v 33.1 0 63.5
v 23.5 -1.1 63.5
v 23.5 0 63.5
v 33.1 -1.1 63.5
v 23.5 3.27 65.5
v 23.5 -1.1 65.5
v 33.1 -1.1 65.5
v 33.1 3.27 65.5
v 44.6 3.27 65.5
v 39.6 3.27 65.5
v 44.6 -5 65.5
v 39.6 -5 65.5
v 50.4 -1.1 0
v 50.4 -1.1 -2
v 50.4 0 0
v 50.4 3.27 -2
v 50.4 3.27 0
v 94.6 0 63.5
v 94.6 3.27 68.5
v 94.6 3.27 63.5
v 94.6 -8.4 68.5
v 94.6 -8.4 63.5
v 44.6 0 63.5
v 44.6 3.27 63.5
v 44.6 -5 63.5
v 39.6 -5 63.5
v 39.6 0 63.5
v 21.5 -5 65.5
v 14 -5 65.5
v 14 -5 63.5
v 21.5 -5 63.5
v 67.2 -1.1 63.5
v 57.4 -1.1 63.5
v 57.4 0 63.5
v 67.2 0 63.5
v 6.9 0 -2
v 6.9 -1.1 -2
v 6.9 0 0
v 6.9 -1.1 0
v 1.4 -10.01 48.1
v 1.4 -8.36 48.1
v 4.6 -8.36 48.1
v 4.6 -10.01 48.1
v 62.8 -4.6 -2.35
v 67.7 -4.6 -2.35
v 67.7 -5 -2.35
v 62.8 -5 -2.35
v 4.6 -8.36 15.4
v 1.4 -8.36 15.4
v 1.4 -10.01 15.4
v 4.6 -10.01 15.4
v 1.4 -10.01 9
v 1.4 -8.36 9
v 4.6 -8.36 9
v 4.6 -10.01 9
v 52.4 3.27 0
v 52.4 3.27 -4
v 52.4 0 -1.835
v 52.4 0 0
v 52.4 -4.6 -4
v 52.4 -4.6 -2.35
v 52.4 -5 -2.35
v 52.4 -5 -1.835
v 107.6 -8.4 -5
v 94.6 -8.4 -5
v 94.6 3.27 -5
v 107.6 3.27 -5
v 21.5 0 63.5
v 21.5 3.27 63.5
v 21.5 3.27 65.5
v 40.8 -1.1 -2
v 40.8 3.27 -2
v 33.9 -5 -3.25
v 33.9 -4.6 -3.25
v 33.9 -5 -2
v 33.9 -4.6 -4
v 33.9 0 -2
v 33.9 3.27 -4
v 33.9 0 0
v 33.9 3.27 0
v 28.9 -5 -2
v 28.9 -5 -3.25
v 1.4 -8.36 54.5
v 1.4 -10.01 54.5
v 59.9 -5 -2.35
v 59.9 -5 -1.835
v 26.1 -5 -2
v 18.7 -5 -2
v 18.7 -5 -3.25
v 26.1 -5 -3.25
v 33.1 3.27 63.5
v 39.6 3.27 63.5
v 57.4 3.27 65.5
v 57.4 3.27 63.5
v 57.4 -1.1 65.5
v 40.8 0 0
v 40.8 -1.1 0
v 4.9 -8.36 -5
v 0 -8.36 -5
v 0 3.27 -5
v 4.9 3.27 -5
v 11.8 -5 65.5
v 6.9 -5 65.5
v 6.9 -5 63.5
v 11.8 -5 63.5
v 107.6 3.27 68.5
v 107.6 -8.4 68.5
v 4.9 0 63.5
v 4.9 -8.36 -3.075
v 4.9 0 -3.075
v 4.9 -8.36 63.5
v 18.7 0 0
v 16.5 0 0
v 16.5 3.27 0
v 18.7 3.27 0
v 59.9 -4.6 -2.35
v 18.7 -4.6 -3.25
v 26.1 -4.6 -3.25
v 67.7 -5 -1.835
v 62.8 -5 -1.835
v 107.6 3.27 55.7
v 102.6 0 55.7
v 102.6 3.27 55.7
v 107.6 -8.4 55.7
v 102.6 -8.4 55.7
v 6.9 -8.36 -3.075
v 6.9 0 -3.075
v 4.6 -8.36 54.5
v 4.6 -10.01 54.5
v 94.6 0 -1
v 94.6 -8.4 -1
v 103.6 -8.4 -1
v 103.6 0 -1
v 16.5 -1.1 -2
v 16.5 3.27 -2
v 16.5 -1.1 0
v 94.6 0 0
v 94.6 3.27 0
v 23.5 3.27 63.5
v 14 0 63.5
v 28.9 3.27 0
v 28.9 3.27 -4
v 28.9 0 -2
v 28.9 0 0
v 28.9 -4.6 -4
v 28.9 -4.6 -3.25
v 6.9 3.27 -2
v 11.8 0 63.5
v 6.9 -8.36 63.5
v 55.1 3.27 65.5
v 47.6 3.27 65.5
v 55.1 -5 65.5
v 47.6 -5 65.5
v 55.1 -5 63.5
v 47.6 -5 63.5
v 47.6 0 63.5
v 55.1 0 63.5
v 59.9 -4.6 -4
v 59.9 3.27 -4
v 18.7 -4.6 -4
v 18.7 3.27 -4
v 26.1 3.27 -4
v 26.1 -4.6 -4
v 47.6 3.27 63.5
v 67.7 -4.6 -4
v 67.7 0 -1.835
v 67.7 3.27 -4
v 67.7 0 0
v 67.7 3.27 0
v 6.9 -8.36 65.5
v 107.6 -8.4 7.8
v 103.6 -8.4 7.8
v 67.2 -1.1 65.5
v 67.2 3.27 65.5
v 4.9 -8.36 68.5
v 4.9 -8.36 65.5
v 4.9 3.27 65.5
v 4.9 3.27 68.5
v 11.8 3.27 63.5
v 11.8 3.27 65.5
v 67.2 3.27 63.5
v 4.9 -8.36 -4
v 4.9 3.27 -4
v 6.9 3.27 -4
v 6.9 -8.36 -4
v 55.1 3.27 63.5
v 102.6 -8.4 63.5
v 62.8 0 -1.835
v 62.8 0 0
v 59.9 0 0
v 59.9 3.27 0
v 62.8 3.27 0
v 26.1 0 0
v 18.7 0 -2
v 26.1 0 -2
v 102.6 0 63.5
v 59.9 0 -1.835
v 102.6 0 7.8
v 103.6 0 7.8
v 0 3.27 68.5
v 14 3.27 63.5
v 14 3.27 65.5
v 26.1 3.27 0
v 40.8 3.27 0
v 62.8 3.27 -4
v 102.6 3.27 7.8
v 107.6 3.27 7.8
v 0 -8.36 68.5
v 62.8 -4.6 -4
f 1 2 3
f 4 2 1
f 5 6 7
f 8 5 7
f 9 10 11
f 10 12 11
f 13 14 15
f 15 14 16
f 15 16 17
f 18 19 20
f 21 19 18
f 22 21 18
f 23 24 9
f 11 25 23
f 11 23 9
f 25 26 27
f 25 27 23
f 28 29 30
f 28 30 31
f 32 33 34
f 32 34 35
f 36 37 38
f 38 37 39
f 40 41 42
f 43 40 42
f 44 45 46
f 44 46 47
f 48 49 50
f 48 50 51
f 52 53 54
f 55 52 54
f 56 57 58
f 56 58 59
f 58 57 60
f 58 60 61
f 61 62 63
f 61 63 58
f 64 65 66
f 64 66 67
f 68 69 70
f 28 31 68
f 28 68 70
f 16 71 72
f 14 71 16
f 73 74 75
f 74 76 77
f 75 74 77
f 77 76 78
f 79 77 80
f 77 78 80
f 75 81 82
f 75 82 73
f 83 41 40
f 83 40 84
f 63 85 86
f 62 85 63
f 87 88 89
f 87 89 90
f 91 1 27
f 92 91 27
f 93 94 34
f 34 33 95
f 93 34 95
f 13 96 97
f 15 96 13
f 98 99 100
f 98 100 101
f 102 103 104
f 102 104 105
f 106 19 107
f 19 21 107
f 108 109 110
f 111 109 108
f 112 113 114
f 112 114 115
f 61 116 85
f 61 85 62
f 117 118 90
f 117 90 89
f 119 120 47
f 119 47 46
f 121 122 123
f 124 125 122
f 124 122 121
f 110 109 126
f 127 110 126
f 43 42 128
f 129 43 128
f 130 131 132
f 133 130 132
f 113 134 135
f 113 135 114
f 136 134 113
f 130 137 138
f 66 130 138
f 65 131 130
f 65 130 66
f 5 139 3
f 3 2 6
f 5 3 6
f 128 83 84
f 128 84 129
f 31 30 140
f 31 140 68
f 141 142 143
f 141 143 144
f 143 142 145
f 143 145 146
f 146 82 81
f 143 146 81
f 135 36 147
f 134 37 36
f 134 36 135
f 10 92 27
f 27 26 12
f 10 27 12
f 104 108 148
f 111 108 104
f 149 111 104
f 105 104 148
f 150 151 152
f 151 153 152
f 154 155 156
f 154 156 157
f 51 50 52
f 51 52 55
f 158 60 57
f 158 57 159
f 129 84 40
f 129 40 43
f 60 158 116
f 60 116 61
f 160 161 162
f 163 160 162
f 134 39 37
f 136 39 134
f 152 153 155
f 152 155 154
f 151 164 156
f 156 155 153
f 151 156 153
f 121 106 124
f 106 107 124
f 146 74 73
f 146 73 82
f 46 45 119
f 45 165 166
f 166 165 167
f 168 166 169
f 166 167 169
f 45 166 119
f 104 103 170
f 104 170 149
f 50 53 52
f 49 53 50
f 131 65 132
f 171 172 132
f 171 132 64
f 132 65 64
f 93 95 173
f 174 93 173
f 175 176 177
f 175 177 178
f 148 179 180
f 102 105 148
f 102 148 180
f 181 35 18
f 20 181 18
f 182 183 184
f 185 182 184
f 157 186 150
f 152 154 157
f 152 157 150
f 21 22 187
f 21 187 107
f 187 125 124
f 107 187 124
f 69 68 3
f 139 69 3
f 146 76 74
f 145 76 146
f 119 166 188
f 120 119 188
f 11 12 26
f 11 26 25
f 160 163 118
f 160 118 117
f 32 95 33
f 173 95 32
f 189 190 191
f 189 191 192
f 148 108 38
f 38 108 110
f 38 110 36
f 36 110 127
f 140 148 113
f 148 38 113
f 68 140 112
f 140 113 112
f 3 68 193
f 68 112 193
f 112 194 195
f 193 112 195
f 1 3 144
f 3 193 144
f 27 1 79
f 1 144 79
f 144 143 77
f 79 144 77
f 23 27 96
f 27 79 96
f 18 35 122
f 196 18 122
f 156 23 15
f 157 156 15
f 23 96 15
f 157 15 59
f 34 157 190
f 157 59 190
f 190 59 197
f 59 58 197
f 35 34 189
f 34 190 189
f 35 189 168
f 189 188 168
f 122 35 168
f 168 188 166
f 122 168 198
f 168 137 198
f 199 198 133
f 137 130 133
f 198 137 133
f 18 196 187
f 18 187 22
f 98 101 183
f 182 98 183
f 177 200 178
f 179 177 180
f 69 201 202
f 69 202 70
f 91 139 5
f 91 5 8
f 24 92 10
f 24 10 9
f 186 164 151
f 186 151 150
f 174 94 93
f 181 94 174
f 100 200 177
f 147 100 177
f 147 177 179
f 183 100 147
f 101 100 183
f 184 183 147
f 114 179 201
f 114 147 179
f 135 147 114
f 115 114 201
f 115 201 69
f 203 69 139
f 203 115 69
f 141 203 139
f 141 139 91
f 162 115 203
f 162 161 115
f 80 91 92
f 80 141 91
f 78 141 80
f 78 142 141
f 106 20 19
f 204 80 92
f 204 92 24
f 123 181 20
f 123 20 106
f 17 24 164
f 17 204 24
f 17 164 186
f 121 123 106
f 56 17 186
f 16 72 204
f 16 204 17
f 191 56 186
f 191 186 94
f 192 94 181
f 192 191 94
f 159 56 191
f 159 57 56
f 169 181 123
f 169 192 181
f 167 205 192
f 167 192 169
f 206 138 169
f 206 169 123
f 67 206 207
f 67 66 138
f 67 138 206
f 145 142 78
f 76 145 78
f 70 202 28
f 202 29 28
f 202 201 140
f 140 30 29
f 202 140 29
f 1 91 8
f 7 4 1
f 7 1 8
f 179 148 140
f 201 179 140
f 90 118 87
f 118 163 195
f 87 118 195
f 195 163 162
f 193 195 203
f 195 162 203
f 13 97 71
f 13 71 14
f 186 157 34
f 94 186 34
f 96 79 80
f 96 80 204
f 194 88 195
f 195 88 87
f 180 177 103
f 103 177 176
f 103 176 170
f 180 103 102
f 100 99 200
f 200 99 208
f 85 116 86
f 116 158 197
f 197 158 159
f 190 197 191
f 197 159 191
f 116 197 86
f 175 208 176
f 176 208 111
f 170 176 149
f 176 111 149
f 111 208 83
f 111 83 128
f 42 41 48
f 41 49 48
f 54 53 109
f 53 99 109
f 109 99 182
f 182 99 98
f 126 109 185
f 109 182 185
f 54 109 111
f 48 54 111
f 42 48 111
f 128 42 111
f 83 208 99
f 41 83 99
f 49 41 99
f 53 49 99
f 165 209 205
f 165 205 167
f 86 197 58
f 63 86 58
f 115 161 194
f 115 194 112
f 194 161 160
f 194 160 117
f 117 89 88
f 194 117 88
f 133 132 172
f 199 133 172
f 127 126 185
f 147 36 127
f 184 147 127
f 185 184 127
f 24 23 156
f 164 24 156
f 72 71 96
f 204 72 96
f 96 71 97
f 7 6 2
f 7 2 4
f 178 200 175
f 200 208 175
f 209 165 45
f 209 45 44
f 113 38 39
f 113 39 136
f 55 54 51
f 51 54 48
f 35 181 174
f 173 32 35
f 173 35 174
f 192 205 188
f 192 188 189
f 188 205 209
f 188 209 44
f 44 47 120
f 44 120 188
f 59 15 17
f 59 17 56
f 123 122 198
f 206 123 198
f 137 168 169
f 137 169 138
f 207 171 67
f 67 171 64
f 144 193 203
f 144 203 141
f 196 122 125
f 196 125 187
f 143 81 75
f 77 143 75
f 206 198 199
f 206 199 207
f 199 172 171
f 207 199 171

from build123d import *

# Parameters (mm, degrees)
CORNERS_DEPTH                      = 8.4
CORNERS_2_DEPTH                    = 8.4
SKETCH2_W                          = 102.6
SKETCH2_H                          = 63.5
MASTER_DEPTH                       = 3
SKETCH3_W                          = 4.9
SKETCH3_H                          = 73.5
END_TAB_DEPTH                      = 8.36
END_TAB_DEPTH_BACK                 = 3.27
SKETCH4_W                          = 3.2
SKETCH4_H                          = 6.4
MALE_CONNECTORS_DEPTH              = 1.65
SKETCH5_W                          = 9.6
SKETCH5_H                          = 2
SKETCH5_W_2                        = 7.4
SKETCH5_H_2                        = 4
SKETCH5_W_3                        = 5
SKETCH5_W_4                        = 7.5
SKETCH5_W_5                        = 4.9
RIGHT_TERMINALS_DEPTH              = 5
RIGHT_TERMINALS_DEPTH_BACK         = 3.27
SKETCH7_W                          = 4.9
SKETCH7_H                          = 2
LEFT_TERMINALS_DEPTH               = 5
LEFT_TERMINALS_DEPTH_BACK          = 3.27
SKETCH7_W_2                        = 7.5
LEFT_TERMINALS_2_DEPTH             = 5
LEFT_TERMINALS_2_DEPTH_BACK        = 3.27
SKETCH7_W_3                        = 9.6
LEFT_TERMINALS_3_DEPTH             = 5
LEFT_TERMINALS_3_DEPTH_BACK        = 3.27
SKETCH7_W_4                        = 5
LEFT_TERMINALS_4_DEPTH             = 5
LEFT_TERMINALS_4_DEPTH_BACK        = 3.27
LEFT_TERMINALS_5_DEPTH             = 5
LEFT_TERMINALS_5_DEPTH_BACK        = 3.27
SKETCH7_W_5                        = 9.8
LEFT_TERMINALS_6_DEPTH             = 5
LEFT_TERMINALS_6_DEPTH_BACK        = 3.27
SKETCH8_W                          = 9.6
SKETCH8_H                          = 2
GOLD_PLATE_ADJUSTMENTS_RIGHT_DEPTH = 3.9
SKETCH9_W                          = 9.6
SKETCH9_H                          = 2
SKETCH9_W_2                        = 9.8
GOLD_PLATE_ADJUSTMENTS_LEFT_DEPTH  = 3.9
CORNER_ADJUSTMENT_DEPTH            = 3
SKETCH13_W                         = 97.7
SKETCH13_H                         = 63.5
BOSS_EXTRUDE1_DEPTH                = 0.27
SKETCH14_W                         = 13
SKETCH14_H                         = 12.8
BOSS_EXTRUDE2_DEPTH                = 0.27
SKETCH17_W                         = 7.4
SKETCH17_H                         = 2
SKETCH17_W_2                       = 5
SKETCH17_W_3                       = 7.5
SKETCH17_W_4                       = 4.9
CUT_EXTRUDE2_DEPTH                 = 5
SKETCH19_W                         = 15.2
SKETCH19_H                         = 0.4
CUT_EXTRUDE4_DEPTH                 = 0.75
SKETCH20_W                         = 4.9
SKETCH20_H                         = 5
SKETCH20_W_2                       = 7.5
BOSS_EXTRUDE5_DEPTH                = 2.165
SKETCH15_W                         = 2
SKETCH15_H                         = 4
SKETCH15_H_2                       = 2
BOSS_EXTRUDE3_DEPTH                = 11.63
SKETCH21_W                         = 15.3
SKETCH21_H                         = 0.4
CUT_EXTRUDE5_DEPTH                 = 1.65
SKETCH22_W                         = 2
SKETCH22_H                         = 3.074722715
CUT_EXTRUDE7_DEPTH                 = 8.36
SKETCH23_W                         = 9
SKETCH23_H                         = 8.8
CUT_EXTRUDE8_DEPTH                 = 8.4


with BuildPart() as part:
    # Sketch1 → Corners (new body)
    with BuildSketch(Plane(origin=(0, 0, 0), x_dir=(1, 0, 0), z_dir=(0, 1, 0))):
        Polygon((102.6, -63.5), (94.6, -63.5), (94.6, -68.5), (107.6, -68.5), (107.6, -55.7), (102.6, -55.7), align=None)
    extrude(amount=-CORNERS_DEPTH)



with BuildPart() as body_2:
    # Sketch1 → Corners 2 (new body)
    with BuildSketch(Plane(origin=(0, 0, 0), x_dir=(1, 0, 0), z_dir=(0, 1, 0))):
        Polygon((94.6, 5), (94.6, 0), (102.6, 0), (102.6, -7.8), (107.6, -7.8), (107.6, 5), align=None)
    extrude(amount=-CORNERS_2_DEPTH)


with BuildPart() as body_3:
    # Sketch2 → Master (new body)
    with BuildSketch(Plane(origin=(0, 0, 0), x_dir=(1, 0, 0), z_dir=(0, 1, 0))):
        with Locations((51.3, -31.75)):
            Rectangle(SKETCH2_W, SKETCH2_H)
    extrude(amount=MASTER_DEPTH)

    # Sketch3 → End Tab (add, two sides)
    with BuildSketch(Plane.XZ) as end_tab_sk:
        with Locations((2.45, 31.75)):
            Rectangle(SKETCH3_W, SKETCH3_H)
    extrude(amount=END_TAB_DEPTH)
    extrude(end_tab_sk.sketch, amount=-END_TAB_DEPTH_BACK)

    # Sketch4 → Male Connectors (add)
    with BuildSketch(Plane.XZ.offset(8.36)):
        with Locations((3, 12.2)):
            Rectangle(SKETCH4_W, SKETCH4_H)
        with Locations((3, 51.3)):
            Rectangle(SKETCH4_W, SKETCH4_H)
    extrude(amount=MALE_CONNECTORS_DEPTH)

    # Sketch5 → Right Terminals (add, two sides)
    with BuildSketch(Plane.XZ) as right_terminals_sk:
        with Locations((11.7, -1)):
            Rectangle(SKETCH5_W, SKETCH5_H)
        with Locations((22.4, -2)):
            Rectangle(SKETCH5_W_2, SKETCH5_H_2)
        with Locations((31.4, -2)):
            Rectangle(SKETCH5_W_3, SKETCH5_H_2)
        with Locations((45.6, -1)):
            Rectangle(SKETCH5_W, SKETCH5_H)
        with Locations((56.15, -2)):
            Rectangle(SKETCH5_W_4, SKETCH5_H_2)
        with Locations((65.25, -2)):
            Rectangle(SKETCH5_W_5, SKETCH5_H_2)
    extrude(amount=RIGHT_TERMINALS_DEPTH)
    extrude(right_terminals_sk.sketch, amount=-RIGHT_TERMINALS_DEPTH_BACK)

    # Sketch8 → Gold Plate Adjustments (Right) (cut)
    with BuildSketch(Plane.XZ.offset(5)):
        with Locations((11.7, -1)):
            Rectangle(SKETCH8_W, SKETCH8_H)
        with Locations((45.6, -1)):
            Rectangle(SKETCH8_W, SKETCH8_H)
    extrude(amount=-GOLD_PLATE_ADJUSTMENTS_RIGHT_DEPTH, mode=Mode.SUBTRACT)


with BuildPart() as body_4:
    # Sketch7 → Left Terminals (new body, two sides)
    with BuildSketch(Plane.XZ) as left_terminals_sk:
        with Locations((9.35, 64.5)):
            Rectangle(SKETCH7_W, SKETCH7_H)
    extrude(amount=LEFT_TERMINALS_DEPTH)
    extrude(left_terminals_sk.sketch, amount=-LEFT_TERMINALS_DEPTH_BACK)


with BuildPart() as body_5:
    # Sketch7 → Left Terminals 2 (new body, two sides)
    with BuildSketch(Plane.XZ) as left_terminals_2_sk:
        with Locations((17.75, 64.5)):
            Rectangle(SKETCH7_W_2, SKETCH7_H)
    extrude(amount=LEFT_TERMINALS_2_DEPTH)
    extrude(left_terminals_2_sk.sketch, amount=-LEFT_TERMINALS_2_DEPTH_BACK)


with BuildPart() as body_6:
    # Sketch7 → Left Terminals 3 (new body, two sides)
    with BuildSketch(Plane.XZ) as left_terminals_3_sk:
        with Locations((28.3, 64.5)):
            Rectangle(SKETCH7_W_3, SKETCH7_H)
    extrude(amount=LEFT_TERMINALS_3_DEPTH)
    extrude(left_terminals_3_sk.sketch, amount=-LEFT_TERMINALS_3_DEPTH_BACK)


with BuildPart() as body_7:
    # Sketch7 → Left Terminals 4 (new body, two sides)
    with BuildSketch(Plane.XZ) as left_terminals_4_sk:
        with Locations((42.1, 64.5)):
            Rectangle(SKETCH7_W_4, SKETCH7_H)
    extrude(amount=LEFT_TERMINALS_4_DEPTH)
    extrude(left_terminals_4_sk.sketch, amount=-LEFT_TERMINALS_4_DEPTH_BACK)


with BuildPart() as body_8:
    # Sketch7 → Left Terminals 5 (new body, two sides)
    with BuildSketch(Plane.XZ) as left_terminals_5_sk:
        with Locations((51.35, 64.5)):
            Rectangle(SKETCH7_W_2, SKETCH7_H)
    extrude(amount=LEFT_TERMINALS_5_DEPTH)
    extrude(left_terminals_5_sk.sketch, amount=-LEFT_TERMINALS_5_DEPTH_BACK)


with BuildPart() as body_9:
    # Sketch7 → Left Terminals 6 (new body, two sides)
    with BuildSketch(Plane.XZ) as left_terminals_6_sk:
        with Locations((62.3, 64.5)):
            Rectangle(SKETCH7_W_5, SKETCH7_H)
    extrude(amount=LEFT_TERMINALS_6_DEPTH)
    extrude(left_terminals_6_sk.sketch, amount=-LEFT_TERMINALS_6_DEPTH_BACK)


with BuildPart() as gold_plate_adjustments_left_tool:
    # Sketch9 → Gold Plate Adjustments (Left) (new body)
    with BuildSketch(Plane.XZ.offset(5)):
        with Locations((28.3, 64.5)):
            Rectangle(SKETCH9_W, SKETCH9_H)
        with Locations((62.3, 64.5)):
            Rectangle(SKETCH9_W_2, SKETCH9_H)
    extrude(amount=-GOLD_PLATE_ADJUSTMENTS_LEFT_DEPTH)


with BuildPart() as body_6_1:
    add(body_6.part)

    # Gold Plate Adjustments (Left): cut by gold_plate_adjustments_left_tool
    add(gold_plate_adjustments_left_tool.part, mode=Mode.SUBTRACT)


with BuildPart() as body_9_1:
    add(body_9.part)

    # Gold Plate Adjustments (Left): cut by gold_plate_adjustments_left_tool
    add(gold_plate_adjustments_left_tool.part, mode=Mode.SUBTRACT)


with BuildPart() as part_1:
    add(part.part)

    add(body_2.part)  # Corner Adjustment merges body 2

    add(body_3.part)  # Corner Adjustment merges body 3
    # Sketch10 → Corner Adjustment (add)
    with BuildSketch(Plane(origin=(0, 0, 0), x_dir=(1, 0, 0), z_dir=(0, 1, 0))):
        Polygon((102.6, -7.8), (107.6, -7.8), (107.6, 5), (94.6, 5), (94.6, 0), (102.6, 0), align=None)
        Polygon((102.6, -55.7), (107.6, -55.7), (107.6, -68.5), (94.6, -68.5), (94.6, -63.5), (102.6, -63.5), align=None)
    extrude(amount=CORNER_ADJUSTMENT_DEPTH)


    add(body_4.part)  # Boss-Extrude1 merges body 4

    add(body_5.part)  # Boss-Extrude1 merges body 5

    add(body_6_1.part)  # Boss-Extrude1 merges body 6

    add(body_7.part)  # Boss-Extrude1 merges body 7

    add(body_8.part)  # Boss-Extrude1 merges body 8

    add(body_9_1.part)  # Boss-Extrude1 merges body 9
    # Sketch13 → Boss-Extrude1 (add)
    with BuildSketch(Plane(origin=(0, 3, 0), x_dir=(1, 0, 0), z_dir=(0, 1, 0))):
        with Locations((53.75, -31.75)):
            Rectangle(SKETCH13_W, SKETCH13_H)
    extrude(amount=BOSS_EXTRUDE1_DEPTH)

    # Sketch14 → Boss-Extrude2 (add)
    with BuildSketch(Plane(origin=(0, 3, 0), x_dir=(1, 0, 0), z_dir=(0, 1, 0))):
        with Locations((101.1, -62.1)):
            Rectangle(SKETCH14_W, SKETCH14_H)
        with Locations((101.1, -1.4)):
            Rectangle(SKETCH14_W, SKETCH14_H)
    extrude(amount=BOSS_EXTRUDE2_DEPTH)

    # Sketch17 → Cut-Extrude2 (cut)
    with BuildSketch(Plane.XZ.offset(5)):
        with Locations((22.4, -1)):
            Rectangle(SKETCH17_W, SKETCH17_H)
        with Locations((31.4, -1)):
            Rectangle(SKETCH17_W_2, SKETCH17_H)
        with Locations((56.15, -1)):
            Rectangle(SKETCH17_W_3, SKETCH17_H)
        with Locations((65.25, -1)):
            Rectangle(SKETCH17_W_4, SKETCH17_H)
    extrude(amount=-CUT_EXTRUDE2_DEPTH, mode=Mode.SUBTRACT)

    # Sketch19 → Cut-Extrude4 (cut)
    with BuildSketch(Plane(origin=(0, 0, -4), x_dir=(-1, 0, 0), z_dir=(0, 0, -1))):
        with Locations((-26.3, -4.8)):
            Rectangle(SKETCH19_W, SKETCH19_H)
    extrude(amount=-CUT_EXTRUDE4_DEPTH, mode=Mode.SUBTRACT)

    # Sketch20 → Boss-Extrude5 (add)
    with BuildSketch(Plane(origin=(0, 0, -4), x_dir=(-1, 0, 0), z_dir=(0, 0, -1))):
        with Locations((-65.25, -2.5)):
            Rectangle(SKETCH20_W, SKETCH20_H)
        with Locations((-56.15, -2.5)):
            Rectangle(SKETCH20_W_2, SKETCH20_H)
    extrude(amount=-BOSS_EXTRUDE5_DEPTH)

    # Sketch15 → Boss-Extrude3 (add)
    with BuildSketch(Plane(origin=(0, 3.27, 0), x_dir=(1, 0, 0), z_dir=(0, 1, 0))):
        with Locations((5.9, 2)):
            Rectangle(SKETCH15_W, SKETCH15_H)
        with Locations((5.9, -64.5)):
            Rectangle(SKETCH15_W, SKETCH15_H_2)
    extrude(amount=-BOSS_EXTRUDE3_DEPTH)

    # Sketch21 → Cut-Extrude5 (cut)
    with BuildSketch(Plane(origin=(0, 0, -4), x_dir=(-1, 0, 0), z_dir=(0, 0, -1))):
        with Locations((-60.05, -4.8)):
            Rectangle(SKETCH21_W, SKETCH21_H)
    extrude(amount=-CUT_EXTRUDE5_DEPTH, mode=Mode.SUBTRACT)

    # Sketch22 → Cut-Extrude7 (cut)
    with BuildSketch(Plane.XZ.offset(8.36)):
        with Locations((5.9, -1.537361358)):
            Rectangle(SKETCH22_W, SKETCH22_H)
    extrude(amount=-CUT_EXTRUDE7_DEPTH, mode=Mode.SUBTRACT)

    # Sketch23 → Cut-Extrude8 (cut)
    with BuildSketch(Plane.XZ.offset(8.4)):
        with Locations((99.1, 3.4)):
            Rectangle(SKETCH23_W, SKETCH23_H)
    extrude(amount=-CUT_EXTRUDE8_DEPTH, mode=Mode.SUBTRACT)


solid = part_1.part
